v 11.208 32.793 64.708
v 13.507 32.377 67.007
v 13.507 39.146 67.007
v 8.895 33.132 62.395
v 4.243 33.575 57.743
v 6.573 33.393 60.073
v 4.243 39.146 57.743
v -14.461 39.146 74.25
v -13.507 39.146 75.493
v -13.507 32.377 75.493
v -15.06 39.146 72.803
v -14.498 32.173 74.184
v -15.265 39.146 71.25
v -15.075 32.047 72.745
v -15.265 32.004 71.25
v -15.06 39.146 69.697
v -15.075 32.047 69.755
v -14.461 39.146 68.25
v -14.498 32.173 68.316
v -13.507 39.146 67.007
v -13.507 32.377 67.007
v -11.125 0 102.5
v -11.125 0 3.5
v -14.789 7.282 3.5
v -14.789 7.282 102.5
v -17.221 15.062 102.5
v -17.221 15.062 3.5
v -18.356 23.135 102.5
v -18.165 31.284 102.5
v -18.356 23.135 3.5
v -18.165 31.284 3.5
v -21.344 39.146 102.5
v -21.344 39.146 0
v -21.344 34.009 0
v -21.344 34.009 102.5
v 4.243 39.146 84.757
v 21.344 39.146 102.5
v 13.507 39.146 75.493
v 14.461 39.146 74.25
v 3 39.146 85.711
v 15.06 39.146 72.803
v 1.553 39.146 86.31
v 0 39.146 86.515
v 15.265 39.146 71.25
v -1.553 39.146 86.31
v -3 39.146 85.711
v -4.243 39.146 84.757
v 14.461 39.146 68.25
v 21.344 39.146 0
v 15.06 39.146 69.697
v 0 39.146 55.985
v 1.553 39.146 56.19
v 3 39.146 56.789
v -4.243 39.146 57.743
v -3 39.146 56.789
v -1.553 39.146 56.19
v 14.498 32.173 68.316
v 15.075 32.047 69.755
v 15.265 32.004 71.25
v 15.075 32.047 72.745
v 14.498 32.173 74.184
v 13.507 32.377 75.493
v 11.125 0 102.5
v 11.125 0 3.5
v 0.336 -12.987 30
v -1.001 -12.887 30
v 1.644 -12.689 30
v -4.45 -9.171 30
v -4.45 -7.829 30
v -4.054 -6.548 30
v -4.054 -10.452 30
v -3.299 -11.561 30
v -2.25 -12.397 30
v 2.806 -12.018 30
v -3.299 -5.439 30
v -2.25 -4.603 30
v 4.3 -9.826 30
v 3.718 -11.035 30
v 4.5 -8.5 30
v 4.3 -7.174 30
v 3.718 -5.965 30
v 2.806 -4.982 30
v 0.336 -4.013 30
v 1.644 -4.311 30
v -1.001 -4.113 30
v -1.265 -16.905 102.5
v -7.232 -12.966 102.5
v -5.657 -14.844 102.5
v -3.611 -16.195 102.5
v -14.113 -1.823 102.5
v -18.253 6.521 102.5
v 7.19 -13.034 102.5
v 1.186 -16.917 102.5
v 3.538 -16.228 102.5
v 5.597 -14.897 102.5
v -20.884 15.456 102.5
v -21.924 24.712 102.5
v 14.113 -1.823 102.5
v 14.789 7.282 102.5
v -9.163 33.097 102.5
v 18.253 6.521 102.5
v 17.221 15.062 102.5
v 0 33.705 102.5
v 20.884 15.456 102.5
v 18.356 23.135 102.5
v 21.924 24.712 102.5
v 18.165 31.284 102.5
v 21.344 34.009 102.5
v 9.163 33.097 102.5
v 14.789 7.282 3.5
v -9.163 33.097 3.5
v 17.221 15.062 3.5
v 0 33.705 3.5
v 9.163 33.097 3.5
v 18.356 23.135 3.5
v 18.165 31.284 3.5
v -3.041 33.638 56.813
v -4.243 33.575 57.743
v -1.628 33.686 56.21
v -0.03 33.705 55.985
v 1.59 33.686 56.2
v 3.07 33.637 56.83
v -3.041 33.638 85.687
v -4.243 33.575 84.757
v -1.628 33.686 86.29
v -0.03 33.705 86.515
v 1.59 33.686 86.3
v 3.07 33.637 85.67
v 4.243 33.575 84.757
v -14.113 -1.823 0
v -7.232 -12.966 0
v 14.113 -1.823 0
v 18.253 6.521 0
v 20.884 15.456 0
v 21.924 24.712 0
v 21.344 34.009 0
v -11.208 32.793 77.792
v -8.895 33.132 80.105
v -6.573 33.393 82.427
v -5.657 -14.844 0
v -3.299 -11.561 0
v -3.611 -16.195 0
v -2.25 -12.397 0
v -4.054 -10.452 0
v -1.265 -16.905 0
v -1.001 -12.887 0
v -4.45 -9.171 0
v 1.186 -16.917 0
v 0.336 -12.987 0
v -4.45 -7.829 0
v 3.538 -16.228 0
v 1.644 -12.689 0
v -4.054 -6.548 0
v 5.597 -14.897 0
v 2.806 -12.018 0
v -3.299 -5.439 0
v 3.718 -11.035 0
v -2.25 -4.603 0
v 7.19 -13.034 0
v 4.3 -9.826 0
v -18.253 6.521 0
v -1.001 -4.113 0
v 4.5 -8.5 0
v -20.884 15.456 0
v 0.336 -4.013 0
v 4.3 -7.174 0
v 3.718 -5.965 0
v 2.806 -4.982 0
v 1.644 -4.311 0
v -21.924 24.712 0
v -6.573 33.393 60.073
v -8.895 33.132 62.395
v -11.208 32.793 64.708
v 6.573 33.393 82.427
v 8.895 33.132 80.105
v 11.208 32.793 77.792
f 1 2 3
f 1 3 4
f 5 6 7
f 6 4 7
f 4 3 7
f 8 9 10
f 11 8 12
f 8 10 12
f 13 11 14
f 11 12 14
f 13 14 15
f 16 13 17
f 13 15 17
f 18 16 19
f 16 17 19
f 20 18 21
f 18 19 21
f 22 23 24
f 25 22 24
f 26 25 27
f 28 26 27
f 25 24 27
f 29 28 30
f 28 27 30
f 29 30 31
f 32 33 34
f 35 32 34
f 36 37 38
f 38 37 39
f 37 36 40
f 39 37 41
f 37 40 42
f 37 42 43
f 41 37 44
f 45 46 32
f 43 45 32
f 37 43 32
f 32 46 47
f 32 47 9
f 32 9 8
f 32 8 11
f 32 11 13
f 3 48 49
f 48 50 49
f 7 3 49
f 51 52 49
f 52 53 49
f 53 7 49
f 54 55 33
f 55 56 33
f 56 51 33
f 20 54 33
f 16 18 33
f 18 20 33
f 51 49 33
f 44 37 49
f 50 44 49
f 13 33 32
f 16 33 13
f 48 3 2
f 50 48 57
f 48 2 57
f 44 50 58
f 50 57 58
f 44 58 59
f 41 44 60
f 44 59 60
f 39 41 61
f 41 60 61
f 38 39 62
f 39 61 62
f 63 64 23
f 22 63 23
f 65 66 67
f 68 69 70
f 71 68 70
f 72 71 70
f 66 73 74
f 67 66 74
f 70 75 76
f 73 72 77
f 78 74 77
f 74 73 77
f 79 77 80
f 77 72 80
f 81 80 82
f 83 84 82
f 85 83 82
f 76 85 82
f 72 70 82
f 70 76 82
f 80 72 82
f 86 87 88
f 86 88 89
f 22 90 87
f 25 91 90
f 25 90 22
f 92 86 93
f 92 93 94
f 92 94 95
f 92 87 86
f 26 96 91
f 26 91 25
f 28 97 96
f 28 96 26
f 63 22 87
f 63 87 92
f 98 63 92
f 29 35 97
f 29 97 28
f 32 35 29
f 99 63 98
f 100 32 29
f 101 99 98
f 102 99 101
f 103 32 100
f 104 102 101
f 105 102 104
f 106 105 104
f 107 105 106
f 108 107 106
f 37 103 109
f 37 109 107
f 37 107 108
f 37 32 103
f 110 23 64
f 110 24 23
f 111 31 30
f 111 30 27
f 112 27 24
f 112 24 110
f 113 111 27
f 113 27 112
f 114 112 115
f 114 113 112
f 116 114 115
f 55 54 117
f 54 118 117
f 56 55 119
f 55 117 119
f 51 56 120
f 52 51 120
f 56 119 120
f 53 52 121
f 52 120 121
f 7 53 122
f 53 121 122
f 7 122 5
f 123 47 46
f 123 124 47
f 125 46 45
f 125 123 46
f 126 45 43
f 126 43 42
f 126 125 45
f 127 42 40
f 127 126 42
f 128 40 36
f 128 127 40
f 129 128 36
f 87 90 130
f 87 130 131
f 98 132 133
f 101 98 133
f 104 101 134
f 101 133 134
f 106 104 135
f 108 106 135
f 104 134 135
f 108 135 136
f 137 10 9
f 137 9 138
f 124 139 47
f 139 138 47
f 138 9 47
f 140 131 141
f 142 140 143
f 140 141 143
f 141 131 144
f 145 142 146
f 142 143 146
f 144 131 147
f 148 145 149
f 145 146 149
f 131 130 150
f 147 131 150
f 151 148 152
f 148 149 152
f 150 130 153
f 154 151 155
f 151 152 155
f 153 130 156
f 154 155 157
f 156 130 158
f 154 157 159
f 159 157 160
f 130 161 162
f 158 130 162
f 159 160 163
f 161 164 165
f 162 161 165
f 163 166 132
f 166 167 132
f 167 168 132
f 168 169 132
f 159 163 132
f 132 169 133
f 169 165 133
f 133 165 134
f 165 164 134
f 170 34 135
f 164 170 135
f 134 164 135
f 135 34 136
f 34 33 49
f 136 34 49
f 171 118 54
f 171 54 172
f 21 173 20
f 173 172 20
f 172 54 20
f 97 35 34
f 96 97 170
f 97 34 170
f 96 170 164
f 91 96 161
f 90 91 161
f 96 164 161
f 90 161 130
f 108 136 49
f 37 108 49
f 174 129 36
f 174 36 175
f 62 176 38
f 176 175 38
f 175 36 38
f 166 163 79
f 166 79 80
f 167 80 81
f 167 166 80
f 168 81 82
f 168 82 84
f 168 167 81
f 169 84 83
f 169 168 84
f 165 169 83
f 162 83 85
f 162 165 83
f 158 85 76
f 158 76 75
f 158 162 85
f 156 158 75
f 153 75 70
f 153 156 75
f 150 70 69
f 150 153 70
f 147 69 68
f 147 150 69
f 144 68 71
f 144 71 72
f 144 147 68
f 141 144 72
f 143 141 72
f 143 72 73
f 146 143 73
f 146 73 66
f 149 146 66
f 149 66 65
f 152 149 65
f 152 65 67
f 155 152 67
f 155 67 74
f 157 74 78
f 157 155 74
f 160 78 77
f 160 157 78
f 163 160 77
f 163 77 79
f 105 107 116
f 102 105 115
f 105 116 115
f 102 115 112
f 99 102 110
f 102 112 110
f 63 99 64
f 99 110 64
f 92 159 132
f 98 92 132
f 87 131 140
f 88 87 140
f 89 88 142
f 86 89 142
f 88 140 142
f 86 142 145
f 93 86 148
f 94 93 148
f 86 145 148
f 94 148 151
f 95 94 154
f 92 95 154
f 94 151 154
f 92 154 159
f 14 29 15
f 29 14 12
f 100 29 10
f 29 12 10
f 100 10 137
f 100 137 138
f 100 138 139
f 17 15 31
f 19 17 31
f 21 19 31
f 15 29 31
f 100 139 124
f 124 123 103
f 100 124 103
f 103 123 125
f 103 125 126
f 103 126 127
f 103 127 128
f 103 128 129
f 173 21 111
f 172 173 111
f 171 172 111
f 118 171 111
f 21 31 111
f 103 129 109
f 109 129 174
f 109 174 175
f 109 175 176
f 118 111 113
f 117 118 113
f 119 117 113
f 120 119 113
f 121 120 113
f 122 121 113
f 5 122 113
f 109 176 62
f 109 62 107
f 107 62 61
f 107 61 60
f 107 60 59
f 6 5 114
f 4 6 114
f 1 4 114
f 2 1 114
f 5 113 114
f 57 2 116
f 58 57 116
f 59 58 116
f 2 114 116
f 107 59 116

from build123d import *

# Parameters (mm, degrees)
F0_R     = 4.5
F1_DEPTH = 102.5
F2_DEPTH = 3.5
F3_DEPTH = 30
F4_DEPTH = 102.5
F6_DEPTH = 10
F7_R     = 6


with BuildPart() as f1:
    # F0 (on Top) → F1 (new body)
    with BuildSketch(Plane.XY):
        with BuildLine():
            ThreePointArc((21.343557, 34.00853), (0, 37.204707), (-21.343557, 34.00853))
            ThreePointArc((-21.343557, 34.00853), (-20.883556, 15.456117), (-14.112868, -1.822812))
            Line((-14.112868, -1.822812), (-7.232334, -12.965798))
            ThreePointArc((-7.232334, -12.965798), (-0.040256, -16.999905), (7.18971, -13.034101))
            Line((7.18971, -13.034101), (14.112868, -1.822812))
            ThreePointArc((14.112868, -1.822812), (20.883556, 15.456117), (21.343557, 34.00853))
        make_face()
        with Locations((0, -8.5)):
            Circle(F0_R, mode=Mode.SUBTRACT)
        with BuildLine():
            Line((11.125, 0), (0, 0))
            Line((0, 0), (-11.125, 0))
            ThreePointArc((-11.125, 0), (-17.220948, 15.062302), (-18.164667, 31.283983))
            ThreePointArc((-18.164667, 31.283983), (0, 33.704707), (18.164667, 31.283983))
            ThreePointArc((18.164667, 31.283983), (17.220948, 15.062302), (11.125, 0))
        make_face(mode=Mode.SUBTRACT)
        with Locations((0, -8.5)):
            Circle(F0_R)
    extrude(amount=F1_DEPTH)

    # F0 (on Top) → F2 (join)
    with BuildSketch(Plane.XY):
        with BuildLine():
            Line((-11.125, 0), (0, 0))
            Line((0, 0), (11.125, 0))
            ThreePointArc((11.125, 0), (17.220948, 15.062302), (18.164667, 31.283983))
            ThreePointArc((18.164667, 31.283983), (0, 33.704707), (-18.164667, 31.283983))
            ThreePointArc((-18.164667, 31.283983), (-17.220948, 15.062302), (-11.125, 0))
        make_face()
    extrude(amount=F2_DEPTH)

    # F0 (on Top) → F3 (cut)
    with BuildSketch(Plane.XY):
        with Locations((0, -8.5)):
            Circle(F0_R)
    extrude(amount=F3_DEPTH, mode=Mode.SUBTRACT)

    # F0 (on Top) → F4 (join)
    with BuildSketch(Plane.XY):
        with BuildLine():
            Line((-21.343557, 39.146077), (-21.343557, 34.00853))
            ThreePointArc((-21.343557, 34.00853), (0, 37.204707), (21.343557, 34.00853))
            Line((21.343557, 34.00853), (21.343557, 39.146077))
            Line((21.343557, 39.146077), (-21.343557, 39.146077))
        make_face()
    extrude(amount=F4_DEPTH)

    # F5 (on face) → F6 (cut)
    with BuildSketch(Plane(origin=(0, 39.146077, 0), x_dir=(-1, 0, 0), z_dir=(0, 1, 0))):
        Polygon((0, 89), (-17.75, 71.25), (0, 53.5), (17.75, 71.25), align=None)
    extrude(amount=-F6_DEPTH, mode=Mode.SUBTRACT)

    # F7
    f7_edges = [f1.edges().sort_by_distance(p)[0] for p in [
        (-17.75, 35.270601, 71.25),
        (0, 36.425392, 53.5),
        (17.75, 35.270601, 71.25),
        (0, 36.425392, 89),
    ]]
    fillet(f7_edges, radius=F7_R)


solid = f1.part
